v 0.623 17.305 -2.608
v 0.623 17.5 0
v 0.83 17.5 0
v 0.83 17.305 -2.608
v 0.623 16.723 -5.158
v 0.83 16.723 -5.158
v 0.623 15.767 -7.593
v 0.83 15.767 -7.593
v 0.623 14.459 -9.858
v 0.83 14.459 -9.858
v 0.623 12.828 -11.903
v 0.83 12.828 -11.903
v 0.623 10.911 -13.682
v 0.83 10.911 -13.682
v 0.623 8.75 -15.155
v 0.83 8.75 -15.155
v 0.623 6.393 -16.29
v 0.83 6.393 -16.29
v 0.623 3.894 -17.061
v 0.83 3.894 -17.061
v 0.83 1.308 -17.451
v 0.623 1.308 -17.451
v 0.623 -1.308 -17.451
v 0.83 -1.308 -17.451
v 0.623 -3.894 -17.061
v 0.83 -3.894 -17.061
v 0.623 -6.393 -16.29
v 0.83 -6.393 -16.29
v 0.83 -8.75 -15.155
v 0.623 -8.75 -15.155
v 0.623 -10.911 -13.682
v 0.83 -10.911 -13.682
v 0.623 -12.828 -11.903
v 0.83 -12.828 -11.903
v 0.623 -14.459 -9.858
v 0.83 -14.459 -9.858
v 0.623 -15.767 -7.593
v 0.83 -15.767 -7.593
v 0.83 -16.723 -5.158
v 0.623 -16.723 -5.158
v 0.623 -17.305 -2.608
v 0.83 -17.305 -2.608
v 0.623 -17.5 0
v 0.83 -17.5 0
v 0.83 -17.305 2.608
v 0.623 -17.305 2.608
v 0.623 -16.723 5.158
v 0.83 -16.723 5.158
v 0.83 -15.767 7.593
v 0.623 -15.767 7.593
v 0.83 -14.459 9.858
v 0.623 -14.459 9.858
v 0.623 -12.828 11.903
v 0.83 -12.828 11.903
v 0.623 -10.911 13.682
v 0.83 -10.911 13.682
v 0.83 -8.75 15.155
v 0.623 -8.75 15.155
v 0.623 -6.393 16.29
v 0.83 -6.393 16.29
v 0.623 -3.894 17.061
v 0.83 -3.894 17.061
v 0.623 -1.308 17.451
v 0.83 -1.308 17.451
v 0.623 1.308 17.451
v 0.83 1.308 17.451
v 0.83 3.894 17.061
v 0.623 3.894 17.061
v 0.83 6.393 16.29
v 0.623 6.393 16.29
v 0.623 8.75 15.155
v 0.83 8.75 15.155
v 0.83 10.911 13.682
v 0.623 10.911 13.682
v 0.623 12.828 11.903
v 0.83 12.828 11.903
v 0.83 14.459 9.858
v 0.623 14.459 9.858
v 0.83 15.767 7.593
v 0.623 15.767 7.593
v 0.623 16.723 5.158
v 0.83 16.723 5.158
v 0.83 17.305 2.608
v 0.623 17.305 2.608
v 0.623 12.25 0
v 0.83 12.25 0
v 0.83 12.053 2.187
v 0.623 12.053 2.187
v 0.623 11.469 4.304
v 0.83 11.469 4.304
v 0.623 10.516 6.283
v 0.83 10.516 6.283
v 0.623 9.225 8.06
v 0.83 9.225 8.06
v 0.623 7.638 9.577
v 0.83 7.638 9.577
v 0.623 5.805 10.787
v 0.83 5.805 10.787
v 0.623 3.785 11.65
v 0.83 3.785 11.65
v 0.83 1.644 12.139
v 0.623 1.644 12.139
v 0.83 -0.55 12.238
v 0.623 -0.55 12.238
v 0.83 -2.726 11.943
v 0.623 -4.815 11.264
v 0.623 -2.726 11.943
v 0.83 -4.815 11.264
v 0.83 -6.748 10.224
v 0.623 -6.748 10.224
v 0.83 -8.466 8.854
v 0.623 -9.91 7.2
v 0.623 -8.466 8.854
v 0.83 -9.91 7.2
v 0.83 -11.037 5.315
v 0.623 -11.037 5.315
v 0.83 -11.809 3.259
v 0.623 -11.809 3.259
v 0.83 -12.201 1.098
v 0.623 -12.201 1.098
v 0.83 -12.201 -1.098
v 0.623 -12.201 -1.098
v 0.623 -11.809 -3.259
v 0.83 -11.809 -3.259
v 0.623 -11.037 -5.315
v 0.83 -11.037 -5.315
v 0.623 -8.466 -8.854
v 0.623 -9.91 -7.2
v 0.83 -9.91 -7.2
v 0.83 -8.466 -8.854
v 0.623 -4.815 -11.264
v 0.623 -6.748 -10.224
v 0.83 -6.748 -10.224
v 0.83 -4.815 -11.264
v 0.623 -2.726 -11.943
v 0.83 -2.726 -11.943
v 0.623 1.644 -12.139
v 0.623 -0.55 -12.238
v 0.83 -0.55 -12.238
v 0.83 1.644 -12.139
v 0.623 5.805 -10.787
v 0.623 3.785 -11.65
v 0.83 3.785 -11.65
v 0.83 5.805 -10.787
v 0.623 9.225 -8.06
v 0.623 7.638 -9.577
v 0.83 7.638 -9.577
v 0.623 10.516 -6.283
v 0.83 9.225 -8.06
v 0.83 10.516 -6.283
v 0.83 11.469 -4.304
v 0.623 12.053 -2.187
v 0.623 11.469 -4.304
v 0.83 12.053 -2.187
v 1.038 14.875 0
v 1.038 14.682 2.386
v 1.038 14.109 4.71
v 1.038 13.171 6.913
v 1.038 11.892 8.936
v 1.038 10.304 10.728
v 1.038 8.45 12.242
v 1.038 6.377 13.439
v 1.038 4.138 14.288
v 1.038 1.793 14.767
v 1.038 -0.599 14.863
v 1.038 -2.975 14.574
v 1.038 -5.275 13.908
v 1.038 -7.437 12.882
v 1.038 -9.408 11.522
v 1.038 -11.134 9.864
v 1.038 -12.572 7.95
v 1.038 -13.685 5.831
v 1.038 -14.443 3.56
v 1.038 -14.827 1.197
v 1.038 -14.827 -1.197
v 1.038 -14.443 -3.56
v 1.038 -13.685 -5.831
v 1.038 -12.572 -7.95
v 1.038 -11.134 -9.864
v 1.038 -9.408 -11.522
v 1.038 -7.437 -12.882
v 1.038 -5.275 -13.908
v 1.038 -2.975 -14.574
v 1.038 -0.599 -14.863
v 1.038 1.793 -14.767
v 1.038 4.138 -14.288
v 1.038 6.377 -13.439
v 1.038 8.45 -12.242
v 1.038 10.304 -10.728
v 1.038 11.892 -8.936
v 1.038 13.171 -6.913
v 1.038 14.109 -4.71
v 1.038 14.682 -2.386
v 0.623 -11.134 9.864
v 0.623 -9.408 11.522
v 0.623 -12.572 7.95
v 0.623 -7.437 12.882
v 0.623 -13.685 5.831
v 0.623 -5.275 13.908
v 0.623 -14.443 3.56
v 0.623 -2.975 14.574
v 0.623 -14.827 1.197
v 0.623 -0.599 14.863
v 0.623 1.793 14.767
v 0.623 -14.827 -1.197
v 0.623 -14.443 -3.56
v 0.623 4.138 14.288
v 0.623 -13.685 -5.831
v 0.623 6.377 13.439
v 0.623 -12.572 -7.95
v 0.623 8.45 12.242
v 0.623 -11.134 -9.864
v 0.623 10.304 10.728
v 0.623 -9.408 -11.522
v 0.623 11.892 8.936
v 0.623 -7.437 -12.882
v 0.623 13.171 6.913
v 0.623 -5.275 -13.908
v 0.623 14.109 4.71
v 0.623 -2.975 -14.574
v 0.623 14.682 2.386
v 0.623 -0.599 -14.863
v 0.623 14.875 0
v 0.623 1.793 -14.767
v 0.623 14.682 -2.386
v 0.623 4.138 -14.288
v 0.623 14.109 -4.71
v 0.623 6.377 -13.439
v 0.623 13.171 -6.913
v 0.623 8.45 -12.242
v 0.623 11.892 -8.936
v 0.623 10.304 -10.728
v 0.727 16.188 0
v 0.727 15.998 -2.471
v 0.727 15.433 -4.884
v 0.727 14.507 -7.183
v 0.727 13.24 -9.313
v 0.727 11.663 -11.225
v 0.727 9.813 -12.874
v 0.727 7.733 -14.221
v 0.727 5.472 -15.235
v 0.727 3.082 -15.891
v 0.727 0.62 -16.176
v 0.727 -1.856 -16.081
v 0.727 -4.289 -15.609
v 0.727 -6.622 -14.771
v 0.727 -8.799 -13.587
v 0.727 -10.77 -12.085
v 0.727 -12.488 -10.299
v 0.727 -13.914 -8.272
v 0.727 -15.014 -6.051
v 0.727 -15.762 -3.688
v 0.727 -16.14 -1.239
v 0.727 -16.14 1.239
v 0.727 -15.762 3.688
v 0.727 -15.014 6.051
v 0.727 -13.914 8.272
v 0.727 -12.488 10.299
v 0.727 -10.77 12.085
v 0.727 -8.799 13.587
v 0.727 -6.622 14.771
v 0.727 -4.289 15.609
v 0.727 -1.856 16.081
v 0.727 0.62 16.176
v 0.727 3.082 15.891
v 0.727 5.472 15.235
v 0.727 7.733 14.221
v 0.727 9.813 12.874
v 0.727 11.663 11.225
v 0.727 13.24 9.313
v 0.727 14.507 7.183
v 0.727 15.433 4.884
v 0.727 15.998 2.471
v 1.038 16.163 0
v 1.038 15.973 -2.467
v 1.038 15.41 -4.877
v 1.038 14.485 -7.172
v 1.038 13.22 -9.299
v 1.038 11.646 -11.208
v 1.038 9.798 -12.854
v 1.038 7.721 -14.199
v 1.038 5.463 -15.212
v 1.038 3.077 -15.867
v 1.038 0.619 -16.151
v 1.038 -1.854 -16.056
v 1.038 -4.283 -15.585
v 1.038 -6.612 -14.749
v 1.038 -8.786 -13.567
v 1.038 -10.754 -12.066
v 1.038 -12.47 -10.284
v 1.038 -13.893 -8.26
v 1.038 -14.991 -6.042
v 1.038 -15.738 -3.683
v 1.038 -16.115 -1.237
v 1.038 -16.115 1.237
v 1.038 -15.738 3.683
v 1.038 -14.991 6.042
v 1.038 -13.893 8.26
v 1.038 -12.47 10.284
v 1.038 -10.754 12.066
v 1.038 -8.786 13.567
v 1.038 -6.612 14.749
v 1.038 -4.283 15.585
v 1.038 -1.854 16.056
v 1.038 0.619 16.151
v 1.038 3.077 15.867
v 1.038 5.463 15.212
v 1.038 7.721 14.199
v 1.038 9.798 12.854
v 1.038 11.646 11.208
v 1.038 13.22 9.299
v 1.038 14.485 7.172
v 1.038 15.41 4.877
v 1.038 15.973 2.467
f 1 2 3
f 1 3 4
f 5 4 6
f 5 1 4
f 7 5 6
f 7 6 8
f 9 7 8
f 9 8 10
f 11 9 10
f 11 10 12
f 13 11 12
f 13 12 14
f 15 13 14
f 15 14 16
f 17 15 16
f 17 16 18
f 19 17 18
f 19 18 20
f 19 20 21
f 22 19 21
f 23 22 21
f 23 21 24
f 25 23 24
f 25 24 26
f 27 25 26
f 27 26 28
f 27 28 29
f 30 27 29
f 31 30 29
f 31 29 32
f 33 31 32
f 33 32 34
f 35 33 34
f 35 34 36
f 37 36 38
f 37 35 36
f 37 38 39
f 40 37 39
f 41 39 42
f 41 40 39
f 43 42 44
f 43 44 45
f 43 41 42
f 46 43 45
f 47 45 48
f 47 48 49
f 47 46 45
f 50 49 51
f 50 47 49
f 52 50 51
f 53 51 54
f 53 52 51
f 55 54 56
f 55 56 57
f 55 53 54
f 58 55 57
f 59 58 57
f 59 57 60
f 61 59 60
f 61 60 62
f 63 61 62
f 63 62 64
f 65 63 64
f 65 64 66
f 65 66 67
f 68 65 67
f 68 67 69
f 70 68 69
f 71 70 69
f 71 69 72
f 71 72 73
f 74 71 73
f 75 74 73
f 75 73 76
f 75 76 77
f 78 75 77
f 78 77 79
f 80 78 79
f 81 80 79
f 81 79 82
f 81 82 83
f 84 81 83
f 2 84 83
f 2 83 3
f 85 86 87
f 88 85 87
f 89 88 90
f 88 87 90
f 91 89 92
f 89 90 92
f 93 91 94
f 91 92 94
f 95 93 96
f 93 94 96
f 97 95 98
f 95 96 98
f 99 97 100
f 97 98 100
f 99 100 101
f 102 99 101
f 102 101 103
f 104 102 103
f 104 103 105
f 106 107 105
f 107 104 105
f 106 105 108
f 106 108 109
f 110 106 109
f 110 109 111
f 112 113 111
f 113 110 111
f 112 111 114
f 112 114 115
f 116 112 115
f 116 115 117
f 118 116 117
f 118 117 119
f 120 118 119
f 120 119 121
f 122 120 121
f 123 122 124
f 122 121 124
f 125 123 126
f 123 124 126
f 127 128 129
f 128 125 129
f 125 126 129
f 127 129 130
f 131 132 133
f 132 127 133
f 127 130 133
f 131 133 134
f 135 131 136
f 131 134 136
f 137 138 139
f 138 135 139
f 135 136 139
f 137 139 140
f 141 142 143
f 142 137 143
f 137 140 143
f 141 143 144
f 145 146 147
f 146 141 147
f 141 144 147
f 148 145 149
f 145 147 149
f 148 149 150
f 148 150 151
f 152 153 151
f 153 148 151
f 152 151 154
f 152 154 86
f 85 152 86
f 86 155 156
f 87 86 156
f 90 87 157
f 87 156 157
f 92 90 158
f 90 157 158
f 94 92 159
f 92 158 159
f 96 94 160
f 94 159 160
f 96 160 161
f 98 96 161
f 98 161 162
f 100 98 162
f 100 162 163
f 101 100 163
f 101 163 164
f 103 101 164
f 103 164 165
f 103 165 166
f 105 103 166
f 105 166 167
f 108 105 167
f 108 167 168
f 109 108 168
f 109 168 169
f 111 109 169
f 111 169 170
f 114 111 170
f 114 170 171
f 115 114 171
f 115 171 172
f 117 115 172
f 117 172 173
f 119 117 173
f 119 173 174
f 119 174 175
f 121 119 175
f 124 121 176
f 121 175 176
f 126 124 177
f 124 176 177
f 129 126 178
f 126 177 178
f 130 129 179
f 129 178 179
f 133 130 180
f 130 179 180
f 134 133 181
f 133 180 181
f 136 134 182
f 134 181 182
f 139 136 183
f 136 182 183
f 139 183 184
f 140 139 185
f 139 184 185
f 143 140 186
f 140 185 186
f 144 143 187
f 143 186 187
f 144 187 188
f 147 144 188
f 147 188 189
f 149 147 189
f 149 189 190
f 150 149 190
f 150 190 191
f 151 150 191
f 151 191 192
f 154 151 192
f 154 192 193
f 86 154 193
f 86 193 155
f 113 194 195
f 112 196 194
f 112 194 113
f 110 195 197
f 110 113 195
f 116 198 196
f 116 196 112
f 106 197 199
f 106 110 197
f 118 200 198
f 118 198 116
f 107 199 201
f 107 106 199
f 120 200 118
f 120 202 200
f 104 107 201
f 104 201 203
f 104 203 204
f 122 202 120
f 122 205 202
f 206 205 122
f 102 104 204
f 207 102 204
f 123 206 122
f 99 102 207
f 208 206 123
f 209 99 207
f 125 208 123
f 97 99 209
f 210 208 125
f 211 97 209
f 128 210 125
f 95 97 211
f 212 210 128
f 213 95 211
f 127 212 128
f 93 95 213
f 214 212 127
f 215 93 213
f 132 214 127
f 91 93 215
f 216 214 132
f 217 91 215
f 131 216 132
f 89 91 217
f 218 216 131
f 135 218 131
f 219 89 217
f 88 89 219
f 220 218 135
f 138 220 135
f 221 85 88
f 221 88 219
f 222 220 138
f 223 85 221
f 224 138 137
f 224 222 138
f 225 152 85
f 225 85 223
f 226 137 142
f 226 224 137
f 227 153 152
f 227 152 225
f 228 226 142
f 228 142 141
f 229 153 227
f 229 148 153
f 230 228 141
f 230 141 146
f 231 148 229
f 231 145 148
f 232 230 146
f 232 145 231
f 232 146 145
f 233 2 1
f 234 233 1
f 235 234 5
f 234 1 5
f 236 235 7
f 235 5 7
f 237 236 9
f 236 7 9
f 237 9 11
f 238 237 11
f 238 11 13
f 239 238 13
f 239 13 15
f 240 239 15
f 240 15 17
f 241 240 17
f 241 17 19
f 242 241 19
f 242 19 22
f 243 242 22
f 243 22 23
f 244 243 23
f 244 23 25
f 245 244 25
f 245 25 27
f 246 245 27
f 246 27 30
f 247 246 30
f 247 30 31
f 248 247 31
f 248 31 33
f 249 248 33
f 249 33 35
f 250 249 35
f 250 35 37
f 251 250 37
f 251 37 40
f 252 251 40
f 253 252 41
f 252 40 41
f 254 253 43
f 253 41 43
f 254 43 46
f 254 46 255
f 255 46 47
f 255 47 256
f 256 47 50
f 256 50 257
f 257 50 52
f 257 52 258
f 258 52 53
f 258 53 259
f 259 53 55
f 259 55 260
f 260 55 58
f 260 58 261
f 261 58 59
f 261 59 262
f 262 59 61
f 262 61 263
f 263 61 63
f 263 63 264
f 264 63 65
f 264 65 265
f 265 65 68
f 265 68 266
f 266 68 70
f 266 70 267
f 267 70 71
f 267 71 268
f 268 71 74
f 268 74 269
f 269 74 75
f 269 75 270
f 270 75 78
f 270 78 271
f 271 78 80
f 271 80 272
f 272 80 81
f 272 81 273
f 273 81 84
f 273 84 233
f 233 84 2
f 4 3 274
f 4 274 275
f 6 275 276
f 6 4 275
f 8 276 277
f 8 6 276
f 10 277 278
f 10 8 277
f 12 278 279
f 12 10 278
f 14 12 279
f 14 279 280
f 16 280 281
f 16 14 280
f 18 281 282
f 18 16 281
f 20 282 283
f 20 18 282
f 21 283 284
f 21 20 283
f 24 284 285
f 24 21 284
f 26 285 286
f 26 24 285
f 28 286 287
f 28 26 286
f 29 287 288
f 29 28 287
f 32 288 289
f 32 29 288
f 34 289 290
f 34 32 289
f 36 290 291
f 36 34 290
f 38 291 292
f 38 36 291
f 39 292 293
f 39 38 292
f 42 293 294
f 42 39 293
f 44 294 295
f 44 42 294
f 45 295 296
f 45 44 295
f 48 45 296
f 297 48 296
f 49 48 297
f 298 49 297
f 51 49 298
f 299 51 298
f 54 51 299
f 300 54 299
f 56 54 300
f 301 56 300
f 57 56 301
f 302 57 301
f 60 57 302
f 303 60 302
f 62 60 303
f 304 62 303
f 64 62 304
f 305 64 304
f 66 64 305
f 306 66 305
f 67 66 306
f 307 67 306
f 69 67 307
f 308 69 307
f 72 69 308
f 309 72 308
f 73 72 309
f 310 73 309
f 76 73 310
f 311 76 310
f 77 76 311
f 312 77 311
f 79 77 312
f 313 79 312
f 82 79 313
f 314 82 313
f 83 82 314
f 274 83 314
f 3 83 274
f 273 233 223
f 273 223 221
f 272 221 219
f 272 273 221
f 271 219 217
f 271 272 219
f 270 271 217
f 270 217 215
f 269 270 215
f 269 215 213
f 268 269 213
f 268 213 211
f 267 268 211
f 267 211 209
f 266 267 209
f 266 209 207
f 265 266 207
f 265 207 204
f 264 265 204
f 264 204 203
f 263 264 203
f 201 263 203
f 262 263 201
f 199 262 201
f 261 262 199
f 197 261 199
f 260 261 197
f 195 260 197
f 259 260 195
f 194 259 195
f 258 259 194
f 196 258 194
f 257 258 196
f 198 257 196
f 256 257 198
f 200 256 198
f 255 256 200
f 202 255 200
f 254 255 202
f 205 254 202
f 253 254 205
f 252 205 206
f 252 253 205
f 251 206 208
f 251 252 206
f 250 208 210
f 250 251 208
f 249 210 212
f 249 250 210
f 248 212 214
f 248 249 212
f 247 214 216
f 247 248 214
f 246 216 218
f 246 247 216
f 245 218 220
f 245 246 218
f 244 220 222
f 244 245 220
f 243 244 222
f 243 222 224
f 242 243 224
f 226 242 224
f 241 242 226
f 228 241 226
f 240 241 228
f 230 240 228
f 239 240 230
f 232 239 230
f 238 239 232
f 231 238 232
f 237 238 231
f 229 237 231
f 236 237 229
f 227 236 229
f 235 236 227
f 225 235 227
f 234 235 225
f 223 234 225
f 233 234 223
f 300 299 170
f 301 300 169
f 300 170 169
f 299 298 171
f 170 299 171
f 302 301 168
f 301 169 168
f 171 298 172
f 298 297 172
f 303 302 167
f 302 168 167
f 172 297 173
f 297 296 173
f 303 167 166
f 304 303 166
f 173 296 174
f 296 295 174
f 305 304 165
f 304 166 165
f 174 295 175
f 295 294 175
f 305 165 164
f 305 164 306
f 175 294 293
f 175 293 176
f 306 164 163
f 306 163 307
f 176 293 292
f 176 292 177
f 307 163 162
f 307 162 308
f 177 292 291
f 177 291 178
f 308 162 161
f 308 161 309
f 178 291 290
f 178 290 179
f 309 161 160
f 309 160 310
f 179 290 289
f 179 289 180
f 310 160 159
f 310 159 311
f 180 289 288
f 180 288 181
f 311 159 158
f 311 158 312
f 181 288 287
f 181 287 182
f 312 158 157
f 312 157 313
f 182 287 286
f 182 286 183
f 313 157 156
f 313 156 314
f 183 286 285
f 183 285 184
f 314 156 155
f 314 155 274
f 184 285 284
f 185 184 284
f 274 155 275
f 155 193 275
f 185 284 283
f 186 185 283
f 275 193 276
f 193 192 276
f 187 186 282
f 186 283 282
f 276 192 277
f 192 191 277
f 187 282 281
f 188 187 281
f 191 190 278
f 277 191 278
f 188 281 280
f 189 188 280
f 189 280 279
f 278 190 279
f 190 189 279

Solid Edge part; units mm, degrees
sketch "Sketch1" plane through (0, 0, 0) normal (0, 0, 1) x (1, 0, 0)
  line L0 (0.623, 12.25) -> (0.8305, 12.25)
  line L1 (0.8305, 12.25) -> (1.038, 14.875)
  line L2 (1.038, 14.875) -> (1.038, 16.1629)
  line L3 (1.038, 16.1629) -> (0.8305, 17.5)
  line L4 (0.8305, 17.5) -> (0.623, 17.5)
  line L5 (0.623, 17.5) -> (0.7268, 16.1875)
  line L6 (0.7268, 16.1875) -> (0.623, 14.875)
  line L7 (0.623, 14.875) -> (0.623, 12.25)
revolve "RevolvedProtrusion1" add sketch "Sketch1" angle 360 about axis through (0.8305, 0, 0) along (-1, 0, 0)
